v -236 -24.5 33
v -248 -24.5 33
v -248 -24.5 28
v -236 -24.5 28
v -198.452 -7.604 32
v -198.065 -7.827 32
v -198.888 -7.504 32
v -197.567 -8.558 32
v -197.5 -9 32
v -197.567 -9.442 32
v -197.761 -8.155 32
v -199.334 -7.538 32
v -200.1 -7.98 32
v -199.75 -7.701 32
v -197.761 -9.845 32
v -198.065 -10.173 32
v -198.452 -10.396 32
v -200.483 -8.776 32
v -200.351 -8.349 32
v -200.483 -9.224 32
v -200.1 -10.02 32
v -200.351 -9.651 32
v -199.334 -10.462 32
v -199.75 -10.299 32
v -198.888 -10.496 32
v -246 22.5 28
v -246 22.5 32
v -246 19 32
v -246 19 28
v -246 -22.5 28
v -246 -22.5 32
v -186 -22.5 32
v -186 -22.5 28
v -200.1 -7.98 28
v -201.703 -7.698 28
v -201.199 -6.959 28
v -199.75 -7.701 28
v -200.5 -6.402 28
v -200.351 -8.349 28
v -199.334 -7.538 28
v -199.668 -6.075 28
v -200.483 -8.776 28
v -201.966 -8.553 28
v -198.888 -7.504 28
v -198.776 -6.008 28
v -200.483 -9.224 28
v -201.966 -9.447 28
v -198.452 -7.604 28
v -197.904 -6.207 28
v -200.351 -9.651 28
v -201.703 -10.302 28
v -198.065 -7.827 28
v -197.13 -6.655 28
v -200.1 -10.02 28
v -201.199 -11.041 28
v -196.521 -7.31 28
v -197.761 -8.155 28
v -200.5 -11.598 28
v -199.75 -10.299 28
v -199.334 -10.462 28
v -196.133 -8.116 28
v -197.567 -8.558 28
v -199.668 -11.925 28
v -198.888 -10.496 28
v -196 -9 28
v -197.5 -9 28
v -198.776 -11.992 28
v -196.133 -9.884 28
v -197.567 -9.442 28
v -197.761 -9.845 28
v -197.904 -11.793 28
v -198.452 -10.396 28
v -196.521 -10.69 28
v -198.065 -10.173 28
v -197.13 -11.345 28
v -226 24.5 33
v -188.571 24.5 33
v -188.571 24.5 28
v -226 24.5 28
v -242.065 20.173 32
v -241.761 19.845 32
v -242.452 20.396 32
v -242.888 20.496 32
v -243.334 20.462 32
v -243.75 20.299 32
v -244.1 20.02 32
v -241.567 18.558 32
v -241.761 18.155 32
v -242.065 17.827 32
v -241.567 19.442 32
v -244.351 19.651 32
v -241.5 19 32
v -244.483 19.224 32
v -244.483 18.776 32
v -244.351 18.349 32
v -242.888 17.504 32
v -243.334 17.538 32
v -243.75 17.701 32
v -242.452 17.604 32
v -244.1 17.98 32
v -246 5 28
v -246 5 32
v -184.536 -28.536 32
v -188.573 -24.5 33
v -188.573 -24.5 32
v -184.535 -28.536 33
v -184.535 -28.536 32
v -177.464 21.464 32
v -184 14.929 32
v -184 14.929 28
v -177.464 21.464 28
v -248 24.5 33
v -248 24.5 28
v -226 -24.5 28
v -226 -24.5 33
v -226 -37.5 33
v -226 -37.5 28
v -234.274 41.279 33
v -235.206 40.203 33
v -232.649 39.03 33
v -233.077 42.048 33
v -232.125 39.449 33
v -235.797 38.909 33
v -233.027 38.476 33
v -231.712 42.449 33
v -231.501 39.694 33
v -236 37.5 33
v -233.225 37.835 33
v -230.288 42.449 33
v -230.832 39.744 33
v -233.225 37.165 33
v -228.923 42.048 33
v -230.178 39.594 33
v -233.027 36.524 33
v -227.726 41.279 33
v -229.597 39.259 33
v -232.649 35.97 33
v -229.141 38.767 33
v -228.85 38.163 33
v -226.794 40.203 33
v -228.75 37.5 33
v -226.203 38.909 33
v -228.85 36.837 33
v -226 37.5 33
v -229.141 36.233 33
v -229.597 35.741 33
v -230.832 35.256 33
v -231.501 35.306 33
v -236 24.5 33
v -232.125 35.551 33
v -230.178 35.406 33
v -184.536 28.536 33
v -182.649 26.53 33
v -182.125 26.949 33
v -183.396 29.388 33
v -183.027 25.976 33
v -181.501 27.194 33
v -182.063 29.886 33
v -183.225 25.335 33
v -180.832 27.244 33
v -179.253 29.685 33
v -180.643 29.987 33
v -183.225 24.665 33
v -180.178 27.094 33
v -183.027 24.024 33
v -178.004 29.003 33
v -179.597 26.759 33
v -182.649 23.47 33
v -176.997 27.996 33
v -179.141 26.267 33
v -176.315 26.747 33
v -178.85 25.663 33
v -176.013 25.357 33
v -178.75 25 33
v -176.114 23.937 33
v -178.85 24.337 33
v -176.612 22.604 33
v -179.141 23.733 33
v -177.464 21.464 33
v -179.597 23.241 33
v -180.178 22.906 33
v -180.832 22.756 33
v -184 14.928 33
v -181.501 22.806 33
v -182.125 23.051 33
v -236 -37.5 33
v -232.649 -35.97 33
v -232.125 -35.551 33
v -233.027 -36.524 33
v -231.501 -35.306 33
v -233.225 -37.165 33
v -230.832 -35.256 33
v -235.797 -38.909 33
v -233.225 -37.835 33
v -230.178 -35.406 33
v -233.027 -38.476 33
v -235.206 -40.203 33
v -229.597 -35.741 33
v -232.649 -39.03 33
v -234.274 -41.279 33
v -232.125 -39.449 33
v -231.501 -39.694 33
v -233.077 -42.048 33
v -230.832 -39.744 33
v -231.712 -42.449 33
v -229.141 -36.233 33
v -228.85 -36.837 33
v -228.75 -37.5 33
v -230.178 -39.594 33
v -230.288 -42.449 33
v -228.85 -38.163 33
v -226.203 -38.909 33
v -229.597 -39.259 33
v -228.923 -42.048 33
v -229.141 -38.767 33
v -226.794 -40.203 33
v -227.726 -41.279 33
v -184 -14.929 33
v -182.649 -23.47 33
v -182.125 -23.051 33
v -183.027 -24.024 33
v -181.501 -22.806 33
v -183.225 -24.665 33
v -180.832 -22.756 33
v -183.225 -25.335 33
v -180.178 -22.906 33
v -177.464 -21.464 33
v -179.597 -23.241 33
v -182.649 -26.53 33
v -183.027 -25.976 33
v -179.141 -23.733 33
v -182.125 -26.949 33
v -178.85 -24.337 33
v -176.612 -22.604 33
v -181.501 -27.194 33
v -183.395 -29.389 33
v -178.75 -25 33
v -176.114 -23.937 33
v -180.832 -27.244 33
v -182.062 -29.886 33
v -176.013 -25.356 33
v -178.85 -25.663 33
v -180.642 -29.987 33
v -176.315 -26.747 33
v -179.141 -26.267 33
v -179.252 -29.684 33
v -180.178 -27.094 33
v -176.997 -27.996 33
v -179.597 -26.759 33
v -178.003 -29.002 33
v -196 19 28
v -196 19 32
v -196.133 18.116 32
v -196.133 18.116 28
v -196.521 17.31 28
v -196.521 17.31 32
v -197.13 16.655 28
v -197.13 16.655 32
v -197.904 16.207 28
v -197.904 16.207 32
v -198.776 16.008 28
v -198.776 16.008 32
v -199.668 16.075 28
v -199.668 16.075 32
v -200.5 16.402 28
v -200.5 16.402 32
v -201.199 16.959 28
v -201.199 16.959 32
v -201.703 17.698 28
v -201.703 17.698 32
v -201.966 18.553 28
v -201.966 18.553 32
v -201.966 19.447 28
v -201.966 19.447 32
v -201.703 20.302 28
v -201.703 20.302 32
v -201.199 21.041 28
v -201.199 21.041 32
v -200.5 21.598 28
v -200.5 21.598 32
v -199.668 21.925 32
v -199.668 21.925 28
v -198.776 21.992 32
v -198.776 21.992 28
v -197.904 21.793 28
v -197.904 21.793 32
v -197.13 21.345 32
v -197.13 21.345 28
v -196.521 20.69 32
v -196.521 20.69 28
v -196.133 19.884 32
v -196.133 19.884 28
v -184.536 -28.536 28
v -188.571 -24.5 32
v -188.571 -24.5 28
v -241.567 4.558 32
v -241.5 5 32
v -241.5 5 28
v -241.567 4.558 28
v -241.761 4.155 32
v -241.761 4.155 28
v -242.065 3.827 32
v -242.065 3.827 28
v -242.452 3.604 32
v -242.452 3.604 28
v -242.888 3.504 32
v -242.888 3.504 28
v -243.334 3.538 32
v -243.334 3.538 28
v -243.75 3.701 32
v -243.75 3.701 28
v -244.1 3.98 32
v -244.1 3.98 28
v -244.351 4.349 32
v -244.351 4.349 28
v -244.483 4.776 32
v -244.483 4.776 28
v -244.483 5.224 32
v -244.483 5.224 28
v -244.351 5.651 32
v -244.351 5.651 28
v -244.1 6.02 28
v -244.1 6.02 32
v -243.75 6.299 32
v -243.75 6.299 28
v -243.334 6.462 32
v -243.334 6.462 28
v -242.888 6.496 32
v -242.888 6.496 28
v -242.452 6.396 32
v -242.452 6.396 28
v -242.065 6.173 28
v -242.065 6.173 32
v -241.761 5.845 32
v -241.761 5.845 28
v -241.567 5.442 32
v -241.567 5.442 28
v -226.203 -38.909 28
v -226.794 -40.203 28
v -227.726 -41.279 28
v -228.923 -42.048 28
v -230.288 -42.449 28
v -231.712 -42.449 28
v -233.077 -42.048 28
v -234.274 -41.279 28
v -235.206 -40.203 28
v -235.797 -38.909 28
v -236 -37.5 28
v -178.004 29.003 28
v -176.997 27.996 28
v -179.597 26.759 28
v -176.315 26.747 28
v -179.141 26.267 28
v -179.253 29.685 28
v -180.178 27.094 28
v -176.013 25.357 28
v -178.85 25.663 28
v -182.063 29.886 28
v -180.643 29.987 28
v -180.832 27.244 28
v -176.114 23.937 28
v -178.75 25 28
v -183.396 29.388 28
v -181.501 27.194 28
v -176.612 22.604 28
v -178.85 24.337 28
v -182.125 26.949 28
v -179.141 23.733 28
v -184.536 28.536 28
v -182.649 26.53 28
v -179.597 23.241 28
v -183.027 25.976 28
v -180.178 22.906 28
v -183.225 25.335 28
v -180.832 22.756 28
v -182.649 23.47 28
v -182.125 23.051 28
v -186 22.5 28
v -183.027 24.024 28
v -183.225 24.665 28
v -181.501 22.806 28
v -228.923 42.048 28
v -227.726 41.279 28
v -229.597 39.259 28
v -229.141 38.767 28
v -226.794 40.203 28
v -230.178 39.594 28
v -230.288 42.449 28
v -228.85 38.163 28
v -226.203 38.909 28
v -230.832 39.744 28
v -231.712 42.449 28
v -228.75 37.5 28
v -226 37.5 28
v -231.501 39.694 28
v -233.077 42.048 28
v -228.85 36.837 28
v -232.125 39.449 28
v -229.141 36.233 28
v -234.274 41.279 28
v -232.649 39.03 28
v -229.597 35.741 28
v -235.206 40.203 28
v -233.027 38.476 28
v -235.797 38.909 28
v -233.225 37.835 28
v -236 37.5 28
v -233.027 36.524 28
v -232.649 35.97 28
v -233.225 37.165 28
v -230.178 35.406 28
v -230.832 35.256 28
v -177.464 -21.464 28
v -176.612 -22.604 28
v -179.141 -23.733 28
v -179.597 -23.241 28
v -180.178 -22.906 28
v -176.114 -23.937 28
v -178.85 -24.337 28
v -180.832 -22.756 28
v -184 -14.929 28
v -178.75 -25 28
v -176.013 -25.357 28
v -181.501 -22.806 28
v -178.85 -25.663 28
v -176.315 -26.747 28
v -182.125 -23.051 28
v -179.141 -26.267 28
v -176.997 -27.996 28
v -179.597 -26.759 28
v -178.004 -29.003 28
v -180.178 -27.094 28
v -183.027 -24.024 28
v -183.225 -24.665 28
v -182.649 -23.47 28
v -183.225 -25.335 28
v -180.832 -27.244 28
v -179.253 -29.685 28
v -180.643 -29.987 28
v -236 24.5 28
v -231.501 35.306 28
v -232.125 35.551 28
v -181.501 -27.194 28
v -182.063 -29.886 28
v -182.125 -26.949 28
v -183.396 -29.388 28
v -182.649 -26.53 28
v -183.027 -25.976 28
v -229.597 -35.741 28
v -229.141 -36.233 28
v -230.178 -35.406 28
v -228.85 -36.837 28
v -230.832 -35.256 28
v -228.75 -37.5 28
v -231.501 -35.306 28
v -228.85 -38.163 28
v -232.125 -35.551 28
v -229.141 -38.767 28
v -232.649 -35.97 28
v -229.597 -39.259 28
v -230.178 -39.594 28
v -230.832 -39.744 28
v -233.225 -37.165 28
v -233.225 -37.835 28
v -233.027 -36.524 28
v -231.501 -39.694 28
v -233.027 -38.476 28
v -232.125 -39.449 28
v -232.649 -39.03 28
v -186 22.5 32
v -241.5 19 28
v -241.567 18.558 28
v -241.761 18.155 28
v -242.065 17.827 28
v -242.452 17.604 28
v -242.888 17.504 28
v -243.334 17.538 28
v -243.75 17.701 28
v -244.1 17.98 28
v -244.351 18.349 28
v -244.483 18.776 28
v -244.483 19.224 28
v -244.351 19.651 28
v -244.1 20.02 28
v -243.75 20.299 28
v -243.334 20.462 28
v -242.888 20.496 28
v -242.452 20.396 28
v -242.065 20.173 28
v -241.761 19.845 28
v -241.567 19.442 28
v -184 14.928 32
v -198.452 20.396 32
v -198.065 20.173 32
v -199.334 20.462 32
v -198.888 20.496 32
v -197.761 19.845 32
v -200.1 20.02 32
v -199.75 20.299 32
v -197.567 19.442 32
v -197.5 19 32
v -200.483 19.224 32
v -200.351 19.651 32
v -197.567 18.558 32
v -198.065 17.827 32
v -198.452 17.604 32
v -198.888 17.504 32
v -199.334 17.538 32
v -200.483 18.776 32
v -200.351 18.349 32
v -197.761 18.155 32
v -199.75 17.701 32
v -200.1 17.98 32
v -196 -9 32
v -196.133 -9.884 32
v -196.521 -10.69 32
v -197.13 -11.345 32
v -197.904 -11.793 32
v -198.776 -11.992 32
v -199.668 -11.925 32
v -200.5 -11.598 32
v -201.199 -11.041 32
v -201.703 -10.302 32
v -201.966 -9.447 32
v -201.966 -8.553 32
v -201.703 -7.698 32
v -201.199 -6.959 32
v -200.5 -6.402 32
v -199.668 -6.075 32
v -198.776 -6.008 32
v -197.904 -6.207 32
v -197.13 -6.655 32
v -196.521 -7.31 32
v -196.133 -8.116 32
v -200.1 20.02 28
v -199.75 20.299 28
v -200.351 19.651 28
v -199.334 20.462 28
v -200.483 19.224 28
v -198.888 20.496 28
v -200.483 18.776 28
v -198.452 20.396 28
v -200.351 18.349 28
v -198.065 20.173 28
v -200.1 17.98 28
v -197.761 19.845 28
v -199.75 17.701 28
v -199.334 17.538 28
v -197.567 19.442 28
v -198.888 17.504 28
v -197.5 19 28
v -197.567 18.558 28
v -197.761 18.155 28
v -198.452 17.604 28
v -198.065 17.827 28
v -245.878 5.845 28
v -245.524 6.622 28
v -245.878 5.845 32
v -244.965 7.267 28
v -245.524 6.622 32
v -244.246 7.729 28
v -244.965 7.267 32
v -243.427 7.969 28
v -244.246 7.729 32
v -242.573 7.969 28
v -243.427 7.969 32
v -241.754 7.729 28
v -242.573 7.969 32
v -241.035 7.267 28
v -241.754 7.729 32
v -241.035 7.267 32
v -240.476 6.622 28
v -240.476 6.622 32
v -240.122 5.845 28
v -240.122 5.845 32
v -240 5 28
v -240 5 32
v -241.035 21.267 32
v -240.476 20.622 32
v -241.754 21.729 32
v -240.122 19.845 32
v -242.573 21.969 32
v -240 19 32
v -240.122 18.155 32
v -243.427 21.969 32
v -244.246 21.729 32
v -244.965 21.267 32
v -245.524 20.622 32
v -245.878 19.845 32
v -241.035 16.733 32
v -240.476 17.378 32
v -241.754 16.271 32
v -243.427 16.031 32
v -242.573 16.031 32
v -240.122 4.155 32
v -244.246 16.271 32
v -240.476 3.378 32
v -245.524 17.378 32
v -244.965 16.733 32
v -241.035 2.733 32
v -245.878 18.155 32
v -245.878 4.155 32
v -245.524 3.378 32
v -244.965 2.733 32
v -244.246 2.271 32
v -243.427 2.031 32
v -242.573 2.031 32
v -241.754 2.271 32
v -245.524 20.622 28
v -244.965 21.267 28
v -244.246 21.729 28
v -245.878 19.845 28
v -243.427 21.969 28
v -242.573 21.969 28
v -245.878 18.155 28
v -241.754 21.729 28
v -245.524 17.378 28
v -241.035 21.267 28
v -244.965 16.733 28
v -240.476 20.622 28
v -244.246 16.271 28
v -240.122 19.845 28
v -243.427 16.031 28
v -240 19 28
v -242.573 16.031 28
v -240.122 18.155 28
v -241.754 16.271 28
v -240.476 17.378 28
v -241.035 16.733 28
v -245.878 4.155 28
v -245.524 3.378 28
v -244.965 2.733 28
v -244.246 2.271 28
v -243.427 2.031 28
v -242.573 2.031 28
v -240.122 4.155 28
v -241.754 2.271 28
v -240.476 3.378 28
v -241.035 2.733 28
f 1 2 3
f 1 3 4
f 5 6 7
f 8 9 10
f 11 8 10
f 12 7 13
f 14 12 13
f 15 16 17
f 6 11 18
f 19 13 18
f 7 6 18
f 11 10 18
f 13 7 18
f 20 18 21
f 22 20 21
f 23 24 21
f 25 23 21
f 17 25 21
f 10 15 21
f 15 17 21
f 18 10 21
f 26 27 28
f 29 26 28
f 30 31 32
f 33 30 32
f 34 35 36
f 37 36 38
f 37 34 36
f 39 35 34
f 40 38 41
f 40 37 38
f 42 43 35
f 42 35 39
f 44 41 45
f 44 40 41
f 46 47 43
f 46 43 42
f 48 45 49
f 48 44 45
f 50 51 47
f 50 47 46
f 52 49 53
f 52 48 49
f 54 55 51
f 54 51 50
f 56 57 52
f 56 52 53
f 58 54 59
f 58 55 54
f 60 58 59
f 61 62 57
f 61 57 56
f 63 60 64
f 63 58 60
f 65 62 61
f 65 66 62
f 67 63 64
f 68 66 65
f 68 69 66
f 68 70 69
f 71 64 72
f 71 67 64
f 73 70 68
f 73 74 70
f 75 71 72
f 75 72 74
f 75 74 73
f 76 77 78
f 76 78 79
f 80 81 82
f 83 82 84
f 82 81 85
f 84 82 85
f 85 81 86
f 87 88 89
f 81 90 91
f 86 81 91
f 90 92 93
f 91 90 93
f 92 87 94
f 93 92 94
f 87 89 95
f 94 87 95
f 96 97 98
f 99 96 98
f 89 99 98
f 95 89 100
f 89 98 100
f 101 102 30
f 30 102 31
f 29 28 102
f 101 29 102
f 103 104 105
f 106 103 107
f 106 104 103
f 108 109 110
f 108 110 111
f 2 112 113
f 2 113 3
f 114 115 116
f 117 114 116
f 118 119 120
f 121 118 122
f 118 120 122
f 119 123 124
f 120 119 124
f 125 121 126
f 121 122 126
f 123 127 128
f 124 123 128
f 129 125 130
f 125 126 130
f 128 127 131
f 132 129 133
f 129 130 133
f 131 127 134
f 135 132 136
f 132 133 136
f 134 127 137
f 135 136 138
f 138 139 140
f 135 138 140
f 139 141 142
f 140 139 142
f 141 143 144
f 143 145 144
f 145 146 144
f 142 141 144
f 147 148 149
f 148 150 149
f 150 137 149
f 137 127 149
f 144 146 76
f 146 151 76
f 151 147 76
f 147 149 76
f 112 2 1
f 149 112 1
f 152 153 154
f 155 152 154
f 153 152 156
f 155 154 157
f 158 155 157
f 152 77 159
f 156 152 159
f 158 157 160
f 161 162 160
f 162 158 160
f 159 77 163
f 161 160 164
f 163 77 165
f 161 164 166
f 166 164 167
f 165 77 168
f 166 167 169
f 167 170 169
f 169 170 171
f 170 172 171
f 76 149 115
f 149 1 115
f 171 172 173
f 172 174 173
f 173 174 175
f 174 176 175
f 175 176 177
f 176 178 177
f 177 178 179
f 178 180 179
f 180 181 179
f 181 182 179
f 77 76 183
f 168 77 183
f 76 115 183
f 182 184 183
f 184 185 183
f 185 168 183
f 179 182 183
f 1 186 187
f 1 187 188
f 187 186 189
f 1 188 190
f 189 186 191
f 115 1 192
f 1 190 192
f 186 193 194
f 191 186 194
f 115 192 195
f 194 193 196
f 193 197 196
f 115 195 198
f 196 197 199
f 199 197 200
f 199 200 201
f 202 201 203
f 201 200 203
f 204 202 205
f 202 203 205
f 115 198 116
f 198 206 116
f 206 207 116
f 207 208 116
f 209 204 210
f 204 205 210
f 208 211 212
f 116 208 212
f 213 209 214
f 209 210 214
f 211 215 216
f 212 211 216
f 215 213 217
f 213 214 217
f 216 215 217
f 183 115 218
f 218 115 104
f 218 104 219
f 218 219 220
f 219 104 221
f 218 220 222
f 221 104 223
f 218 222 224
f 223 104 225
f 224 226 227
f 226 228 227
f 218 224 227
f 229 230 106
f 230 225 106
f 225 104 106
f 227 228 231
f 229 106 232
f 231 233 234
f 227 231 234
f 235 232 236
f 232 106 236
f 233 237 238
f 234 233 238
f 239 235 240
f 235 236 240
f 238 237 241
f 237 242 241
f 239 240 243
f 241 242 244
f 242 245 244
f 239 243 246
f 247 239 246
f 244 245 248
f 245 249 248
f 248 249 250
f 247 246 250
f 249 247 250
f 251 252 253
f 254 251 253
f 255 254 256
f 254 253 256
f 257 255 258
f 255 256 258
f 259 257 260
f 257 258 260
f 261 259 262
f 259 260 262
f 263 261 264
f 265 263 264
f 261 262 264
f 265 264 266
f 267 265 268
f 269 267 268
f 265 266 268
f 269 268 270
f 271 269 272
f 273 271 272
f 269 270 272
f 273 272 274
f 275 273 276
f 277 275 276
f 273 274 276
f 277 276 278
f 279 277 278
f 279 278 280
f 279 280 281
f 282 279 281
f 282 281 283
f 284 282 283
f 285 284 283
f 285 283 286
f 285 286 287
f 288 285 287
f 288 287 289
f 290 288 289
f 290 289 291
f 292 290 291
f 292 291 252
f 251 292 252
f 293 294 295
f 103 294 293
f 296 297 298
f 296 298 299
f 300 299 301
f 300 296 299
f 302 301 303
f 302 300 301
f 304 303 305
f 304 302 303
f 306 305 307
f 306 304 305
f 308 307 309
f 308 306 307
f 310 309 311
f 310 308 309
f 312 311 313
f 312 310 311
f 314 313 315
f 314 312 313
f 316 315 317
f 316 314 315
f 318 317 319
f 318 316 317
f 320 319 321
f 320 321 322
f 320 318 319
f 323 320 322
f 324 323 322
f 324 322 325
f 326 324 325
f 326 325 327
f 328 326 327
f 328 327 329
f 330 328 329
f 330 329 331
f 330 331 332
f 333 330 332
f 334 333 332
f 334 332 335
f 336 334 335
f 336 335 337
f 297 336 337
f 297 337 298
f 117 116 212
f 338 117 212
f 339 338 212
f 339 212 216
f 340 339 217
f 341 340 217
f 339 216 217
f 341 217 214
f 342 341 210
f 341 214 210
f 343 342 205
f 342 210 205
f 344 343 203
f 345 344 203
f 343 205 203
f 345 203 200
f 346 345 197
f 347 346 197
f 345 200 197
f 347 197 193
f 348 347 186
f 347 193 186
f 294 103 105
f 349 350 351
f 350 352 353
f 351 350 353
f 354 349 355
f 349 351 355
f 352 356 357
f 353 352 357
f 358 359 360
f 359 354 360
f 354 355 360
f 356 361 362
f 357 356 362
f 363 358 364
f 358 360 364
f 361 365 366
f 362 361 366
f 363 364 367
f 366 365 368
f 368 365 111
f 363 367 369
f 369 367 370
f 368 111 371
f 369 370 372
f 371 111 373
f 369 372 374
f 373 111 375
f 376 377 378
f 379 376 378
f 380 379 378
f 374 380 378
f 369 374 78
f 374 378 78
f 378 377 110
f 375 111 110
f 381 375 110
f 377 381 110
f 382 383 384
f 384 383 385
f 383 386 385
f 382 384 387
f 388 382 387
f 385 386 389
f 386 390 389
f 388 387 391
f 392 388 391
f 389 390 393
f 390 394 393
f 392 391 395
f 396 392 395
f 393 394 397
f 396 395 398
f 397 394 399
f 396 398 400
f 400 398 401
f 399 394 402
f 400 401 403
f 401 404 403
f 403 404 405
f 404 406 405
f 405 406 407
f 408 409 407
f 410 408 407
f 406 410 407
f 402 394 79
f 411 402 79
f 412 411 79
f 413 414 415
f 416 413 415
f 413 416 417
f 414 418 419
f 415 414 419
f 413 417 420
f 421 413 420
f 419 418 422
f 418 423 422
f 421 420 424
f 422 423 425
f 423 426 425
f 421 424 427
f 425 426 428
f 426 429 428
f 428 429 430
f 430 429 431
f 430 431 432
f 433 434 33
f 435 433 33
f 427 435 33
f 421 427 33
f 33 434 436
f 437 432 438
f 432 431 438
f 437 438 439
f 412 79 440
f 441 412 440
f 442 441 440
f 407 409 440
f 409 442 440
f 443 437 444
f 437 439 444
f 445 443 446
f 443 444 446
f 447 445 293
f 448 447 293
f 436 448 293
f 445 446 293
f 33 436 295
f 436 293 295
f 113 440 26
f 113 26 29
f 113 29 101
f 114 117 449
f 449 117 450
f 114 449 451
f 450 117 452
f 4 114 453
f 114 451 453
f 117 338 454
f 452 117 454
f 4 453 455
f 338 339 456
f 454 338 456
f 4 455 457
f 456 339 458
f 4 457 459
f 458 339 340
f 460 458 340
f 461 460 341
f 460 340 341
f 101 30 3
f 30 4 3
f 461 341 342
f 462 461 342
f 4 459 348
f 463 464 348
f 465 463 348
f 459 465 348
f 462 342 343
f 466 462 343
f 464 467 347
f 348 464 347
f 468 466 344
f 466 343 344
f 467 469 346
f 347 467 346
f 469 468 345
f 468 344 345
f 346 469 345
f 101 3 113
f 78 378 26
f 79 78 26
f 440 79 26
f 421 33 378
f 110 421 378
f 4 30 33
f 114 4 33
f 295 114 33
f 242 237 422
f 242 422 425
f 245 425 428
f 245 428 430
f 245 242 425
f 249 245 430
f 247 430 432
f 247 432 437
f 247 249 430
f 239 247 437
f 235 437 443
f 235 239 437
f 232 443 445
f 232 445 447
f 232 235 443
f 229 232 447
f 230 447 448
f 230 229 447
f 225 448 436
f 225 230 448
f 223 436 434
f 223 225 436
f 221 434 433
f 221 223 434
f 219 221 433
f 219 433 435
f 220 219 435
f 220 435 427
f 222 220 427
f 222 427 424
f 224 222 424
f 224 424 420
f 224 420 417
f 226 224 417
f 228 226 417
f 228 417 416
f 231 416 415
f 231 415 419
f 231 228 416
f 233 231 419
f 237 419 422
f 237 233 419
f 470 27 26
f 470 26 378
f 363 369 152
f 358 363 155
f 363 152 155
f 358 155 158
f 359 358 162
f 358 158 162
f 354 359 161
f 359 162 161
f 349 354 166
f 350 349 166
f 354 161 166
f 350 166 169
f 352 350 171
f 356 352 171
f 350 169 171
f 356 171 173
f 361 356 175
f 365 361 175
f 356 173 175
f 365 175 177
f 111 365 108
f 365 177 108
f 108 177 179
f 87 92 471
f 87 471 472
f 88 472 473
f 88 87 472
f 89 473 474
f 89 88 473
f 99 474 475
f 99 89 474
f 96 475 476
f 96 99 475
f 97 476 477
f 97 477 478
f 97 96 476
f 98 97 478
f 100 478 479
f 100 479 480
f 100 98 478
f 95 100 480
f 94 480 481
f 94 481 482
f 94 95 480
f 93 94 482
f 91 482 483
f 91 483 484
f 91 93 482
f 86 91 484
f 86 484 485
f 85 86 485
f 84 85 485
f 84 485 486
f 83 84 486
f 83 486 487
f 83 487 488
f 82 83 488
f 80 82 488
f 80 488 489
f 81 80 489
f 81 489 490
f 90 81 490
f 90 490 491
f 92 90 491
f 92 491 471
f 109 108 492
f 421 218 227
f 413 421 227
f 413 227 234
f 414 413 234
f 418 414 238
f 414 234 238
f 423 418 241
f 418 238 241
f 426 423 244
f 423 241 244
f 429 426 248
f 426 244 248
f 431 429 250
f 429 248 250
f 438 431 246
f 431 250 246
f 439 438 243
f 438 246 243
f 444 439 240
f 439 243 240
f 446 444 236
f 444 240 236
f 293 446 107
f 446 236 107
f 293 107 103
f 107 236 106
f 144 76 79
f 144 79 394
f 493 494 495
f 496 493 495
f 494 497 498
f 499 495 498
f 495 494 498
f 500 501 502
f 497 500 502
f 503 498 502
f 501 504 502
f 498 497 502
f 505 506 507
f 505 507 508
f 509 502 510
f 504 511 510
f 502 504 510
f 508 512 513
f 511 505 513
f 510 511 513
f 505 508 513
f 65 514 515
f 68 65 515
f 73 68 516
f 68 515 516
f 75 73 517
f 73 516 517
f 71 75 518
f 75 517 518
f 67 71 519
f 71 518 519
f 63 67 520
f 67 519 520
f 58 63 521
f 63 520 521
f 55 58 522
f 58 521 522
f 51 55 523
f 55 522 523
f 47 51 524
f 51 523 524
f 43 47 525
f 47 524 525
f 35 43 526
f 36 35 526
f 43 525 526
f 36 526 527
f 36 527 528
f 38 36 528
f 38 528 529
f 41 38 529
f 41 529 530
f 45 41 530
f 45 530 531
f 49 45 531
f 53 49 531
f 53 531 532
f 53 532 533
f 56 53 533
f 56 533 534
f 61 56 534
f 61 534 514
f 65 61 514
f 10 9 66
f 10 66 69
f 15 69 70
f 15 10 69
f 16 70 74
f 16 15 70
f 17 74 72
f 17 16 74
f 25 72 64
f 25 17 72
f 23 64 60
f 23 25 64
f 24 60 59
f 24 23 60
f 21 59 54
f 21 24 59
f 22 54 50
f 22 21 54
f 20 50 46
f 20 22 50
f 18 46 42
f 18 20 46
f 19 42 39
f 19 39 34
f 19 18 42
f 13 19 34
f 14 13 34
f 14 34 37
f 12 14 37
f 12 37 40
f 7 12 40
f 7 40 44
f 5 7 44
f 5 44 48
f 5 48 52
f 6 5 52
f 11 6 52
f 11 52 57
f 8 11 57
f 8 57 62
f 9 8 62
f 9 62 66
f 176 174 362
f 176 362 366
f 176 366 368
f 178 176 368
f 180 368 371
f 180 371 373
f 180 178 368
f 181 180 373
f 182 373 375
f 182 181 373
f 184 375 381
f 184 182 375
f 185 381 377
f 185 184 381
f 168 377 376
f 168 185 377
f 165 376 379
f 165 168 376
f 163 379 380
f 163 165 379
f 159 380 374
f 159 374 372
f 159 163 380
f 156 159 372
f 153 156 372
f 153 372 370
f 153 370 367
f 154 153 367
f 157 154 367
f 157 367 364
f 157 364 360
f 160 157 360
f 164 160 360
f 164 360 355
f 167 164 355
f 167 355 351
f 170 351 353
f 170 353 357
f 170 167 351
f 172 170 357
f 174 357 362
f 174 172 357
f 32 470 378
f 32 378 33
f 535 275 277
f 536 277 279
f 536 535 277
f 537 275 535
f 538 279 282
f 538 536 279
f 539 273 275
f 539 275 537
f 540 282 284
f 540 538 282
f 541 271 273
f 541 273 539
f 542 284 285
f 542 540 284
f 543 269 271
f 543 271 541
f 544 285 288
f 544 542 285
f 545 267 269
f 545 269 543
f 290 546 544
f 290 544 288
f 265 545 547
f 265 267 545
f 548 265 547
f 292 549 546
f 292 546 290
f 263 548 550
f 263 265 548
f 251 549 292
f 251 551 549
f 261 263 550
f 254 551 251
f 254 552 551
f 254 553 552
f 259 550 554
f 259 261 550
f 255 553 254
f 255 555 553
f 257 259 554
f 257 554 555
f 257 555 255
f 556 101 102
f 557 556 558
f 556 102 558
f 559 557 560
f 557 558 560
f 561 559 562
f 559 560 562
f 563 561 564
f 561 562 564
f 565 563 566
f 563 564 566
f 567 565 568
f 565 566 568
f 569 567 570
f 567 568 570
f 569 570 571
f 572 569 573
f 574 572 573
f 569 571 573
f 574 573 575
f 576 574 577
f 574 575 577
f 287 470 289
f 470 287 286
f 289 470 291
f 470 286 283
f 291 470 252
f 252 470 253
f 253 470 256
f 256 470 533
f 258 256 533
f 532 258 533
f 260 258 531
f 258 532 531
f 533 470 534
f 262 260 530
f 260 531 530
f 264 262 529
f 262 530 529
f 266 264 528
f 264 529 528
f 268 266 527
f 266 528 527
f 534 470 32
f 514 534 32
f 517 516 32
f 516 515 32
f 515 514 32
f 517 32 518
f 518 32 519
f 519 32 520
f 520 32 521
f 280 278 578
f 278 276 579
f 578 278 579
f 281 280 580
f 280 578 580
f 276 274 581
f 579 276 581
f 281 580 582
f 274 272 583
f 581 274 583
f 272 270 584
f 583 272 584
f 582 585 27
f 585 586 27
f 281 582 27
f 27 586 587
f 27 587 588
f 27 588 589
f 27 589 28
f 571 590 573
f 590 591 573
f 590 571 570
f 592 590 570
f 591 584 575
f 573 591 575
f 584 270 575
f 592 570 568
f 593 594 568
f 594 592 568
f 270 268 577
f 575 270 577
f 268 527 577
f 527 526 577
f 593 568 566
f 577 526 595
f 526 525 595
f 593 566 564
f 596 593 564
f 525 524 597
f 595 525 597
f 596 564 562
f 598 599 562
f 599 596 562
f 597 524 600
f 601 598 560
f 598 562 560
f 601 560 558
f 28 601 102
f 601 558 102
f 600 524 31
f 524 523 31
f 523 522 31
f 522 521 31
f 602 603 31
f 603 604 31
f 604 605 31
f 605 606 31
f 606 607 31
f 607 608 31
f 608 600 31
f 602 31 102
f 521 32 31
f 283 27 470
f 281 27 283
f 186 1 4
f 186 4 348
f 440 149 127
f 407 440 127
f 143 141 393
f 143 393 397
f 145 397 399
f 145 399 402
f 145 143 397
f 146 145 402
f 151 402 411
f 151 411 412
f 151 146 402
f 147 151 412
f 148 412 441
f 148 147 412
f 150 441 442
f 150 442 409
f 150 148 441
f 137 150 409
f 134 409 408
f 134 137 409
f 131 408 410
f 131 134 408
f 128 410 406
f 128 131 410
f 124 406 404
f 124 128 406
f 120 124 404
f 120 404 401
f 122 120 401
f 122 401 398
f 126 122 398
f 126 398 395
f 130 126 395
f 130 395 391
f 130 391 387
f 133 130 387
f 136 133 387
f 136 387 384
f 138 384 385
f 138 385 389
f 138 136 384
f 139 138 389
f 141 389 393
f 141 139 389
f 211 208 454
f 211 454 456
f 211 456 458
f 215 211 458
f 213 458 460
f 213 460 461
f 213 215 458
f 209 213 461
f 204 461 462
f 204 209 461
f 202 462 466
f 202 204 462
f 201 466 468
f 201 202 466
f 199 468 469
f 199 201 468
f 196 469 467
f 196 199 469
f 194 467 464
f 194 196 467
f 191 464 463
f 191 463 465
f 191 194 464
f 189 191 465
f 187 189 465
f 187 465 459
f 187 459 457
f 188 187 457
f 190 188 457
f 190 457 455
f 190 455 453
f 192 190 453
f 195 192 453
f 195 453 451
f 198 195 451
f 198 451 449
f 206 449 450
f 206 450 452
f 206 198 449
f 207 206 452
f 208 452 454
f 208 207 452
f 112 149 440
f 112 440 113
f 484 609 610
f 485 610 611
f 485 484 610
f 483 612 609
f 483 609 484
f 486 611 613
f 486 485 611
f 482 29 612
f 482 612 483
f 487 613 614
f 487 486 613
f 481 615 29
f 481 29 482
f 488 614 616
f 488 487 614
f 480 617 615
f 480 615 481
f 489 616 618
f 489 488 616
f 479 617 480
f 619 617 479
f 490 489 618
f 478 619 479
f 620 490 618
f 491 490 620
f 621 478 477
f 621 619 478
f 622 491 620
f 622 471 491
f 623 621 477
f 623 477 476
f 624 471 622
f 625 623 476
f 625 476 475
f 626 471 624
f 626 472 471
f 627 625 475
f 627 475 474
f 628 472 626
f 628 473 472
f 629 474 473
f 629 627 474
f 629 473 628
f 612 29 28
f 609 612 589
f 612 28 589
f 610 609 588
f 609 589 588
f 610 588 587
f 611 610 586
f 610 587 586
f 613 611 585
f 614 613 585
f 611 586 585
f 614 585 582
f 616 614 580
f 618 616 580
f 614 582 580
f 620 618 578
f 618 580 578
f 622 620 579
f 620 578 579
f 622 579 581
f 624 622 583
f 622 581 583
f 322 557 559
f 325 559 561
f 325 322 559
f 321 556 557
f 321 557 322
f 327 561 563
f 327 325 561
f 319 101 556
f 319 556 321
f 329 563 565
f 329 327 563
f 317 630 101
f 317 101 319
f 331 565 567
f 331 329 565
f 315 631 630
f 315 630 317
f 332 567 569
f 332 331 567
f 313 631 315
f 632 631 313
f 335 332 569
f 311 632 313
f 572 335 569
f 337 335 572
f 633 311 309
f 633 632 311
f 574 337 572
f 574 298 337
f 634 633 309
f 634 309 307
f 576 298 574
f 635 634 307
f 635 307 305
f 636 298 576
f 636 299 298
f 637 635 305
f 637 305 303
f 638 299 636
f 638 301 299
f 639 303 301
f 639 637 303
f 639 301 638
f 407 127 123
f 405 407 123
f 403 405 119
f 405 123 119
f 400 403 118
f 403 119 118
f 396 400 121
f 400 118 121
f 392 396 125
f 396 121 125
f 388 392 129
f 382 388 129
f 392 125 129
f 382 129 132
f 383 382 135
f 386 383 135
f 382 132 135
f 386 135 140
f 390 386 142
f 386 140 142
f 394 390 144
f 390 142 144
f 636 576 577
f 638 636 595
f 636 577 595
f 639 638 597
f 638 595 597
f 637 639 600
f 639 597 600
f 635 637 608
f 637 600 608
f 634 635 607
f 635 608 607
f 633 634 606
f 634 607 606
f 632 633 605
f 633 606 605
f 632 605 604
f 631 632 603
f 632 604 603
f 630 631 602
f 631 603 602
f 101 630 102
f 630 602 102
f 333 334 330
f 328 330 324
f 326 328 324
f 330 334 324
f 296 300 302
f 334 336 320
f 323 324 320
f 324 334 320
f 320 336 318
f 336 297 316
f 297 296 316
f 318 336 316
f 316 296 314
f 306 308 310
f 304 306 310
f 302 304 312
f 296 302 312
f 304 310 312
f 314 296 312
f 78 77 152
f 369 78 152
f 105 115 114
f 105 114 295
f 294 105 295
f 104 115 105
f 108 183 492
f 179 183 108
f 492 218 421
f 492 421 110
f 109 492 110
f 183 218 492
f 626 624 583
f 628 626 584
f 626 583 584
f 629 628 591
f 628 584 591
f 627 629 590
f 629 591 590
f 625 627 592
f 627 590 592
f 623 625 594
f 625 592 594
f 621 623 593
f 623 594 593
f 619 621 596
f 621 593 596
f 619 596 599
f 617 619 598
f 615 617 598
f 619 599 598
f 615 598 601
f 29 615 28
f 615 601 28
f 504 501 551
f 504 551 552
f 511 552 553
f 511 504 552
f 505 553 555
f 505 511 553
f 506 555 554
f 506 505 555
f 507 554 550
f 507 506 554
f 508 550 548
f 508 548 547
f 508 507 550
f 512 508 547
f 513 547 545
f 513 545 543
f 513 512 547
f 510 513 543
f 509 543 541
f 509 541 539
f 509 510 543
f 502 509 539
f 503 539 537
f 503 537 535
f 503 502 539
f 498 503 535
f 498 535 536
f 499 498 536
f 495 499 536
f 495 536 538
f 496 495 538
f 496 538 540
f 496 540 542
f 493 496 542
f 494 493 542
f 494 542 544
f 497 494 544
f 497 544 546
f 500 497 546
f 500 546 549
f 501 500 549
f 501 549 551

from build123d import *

# Parameters (mm, degrees)
SKETCH123_W             = 60
SKETCH123_H             = 45
PAD050_DEPTH            = 5
PAD099_DEPTH            = 1
SKETCH128_R             = 3
SKETCH128_R_2           = 1.5
PAD100_DEPTH            = 5
SKETCH223_R             = 2.25
POCKET090_DEPTH         = 5
BODY015_PLACEMENT_ANGLE = 180


with BuildPart() as part:
    # Sketch123 → Pad050 (new body)
    with BuildSketch(Plane.XY):
        with BuildLine():
            Line((-32, 24.5), (-20, 24.5))
            Line((-20, 24.5), (-20, 37.5))
            ThreePointArc((-10, 37.5), (-15, 42.5), (-20, 37.5))
            Line((-10, 24.5), (-10, 37.5))
            Line((-10, 24.5), (27.428932, 24.5))
            Line((27.428932, 24.5), (31.464466, 28.535534))
            ThreePointArc((38.535534, 21.464466), (38.535534, 28.535534), (31.464466, 28.535534))
            Line((32, 14.928932), (38.535534, 21.464466))
            Line((32, 14.928932), (32, -14.928932))
            Line((32, -14.928932), (38.535534, -21.464466))
            ThreePointArc((31.464466, -28.535534), (38.535534, -28.535534), (38.535534, -21.464466))
            Line((27.428932, -24.5), (31.464466, -28.535534))
            Line((27.428932, -24.5), (-10, -24.5))
            Line((-10, -24.5), (-10, -37.5))
            ThreePointArc((-20, -37.5), (-15, -42.5), (-10, -37.5))
            Line((-20, -24.5), (-20, -37.5))
            Line((-20, -24.5), (-32, -24.5))
            Line((-32, -24.5), (-32, 24.5))
        make_face()
        Rectangle(SKETCH123_W, SKETCH123_H, mode=Mode.SUBTRACT)
    extrude(amount=PAD050_DEPTH)

    # Sketch222 → Pad099 (join)
    with BuildSketch(Plane.XY):
        with BuildLine():
            Line((-31, 23.5), (-20, 23.5))
            Line((-20, 23.5), (-20, 37.5))
            ThreePointArc((-10, 37.5), (-15, 42.5), (-20, 37.5))
            Line((-10, 23.5), (-10, 37.5))
            Line((-10, 23.5), (26.426435, 23.5))
            Line((26.426435, 23.5), (31.465342, 28.53641))
            ThreePointArc((38.534658, 21.46359), (38.53641, 28.534658), (31.465342, 28.53641))
            Line((31, 13.932666), (38.534658, 21.46359))
            Line((31, 13.932666), (31, -13.927334))
            Line((31, -13.927334), (38.535909, -21.464841))
            ThreePointArc((31.464091, -28.535159), (38.535159, -28.535909), (38.535909, -21.464841))
            Line((26.43, -23.5), (31.464091, -28.535159))
            Line((26.43, -23.5), (-10, -23.5))
            Line((-10, -23.5), (-10, -37.5))
            ThreePointArc((-20, -37.5), (-15, -42.5), (-10, -37.5))
            Line((-20, -23.5), (-20, -37.5))
            Line((-20, -23.5), (-31, -23.5))
            Line((-31, -23.5), (-31, 23.5))
        make_face()
    extrude(amount=PAD099_DEPTH)

    # Sketch128 → Pad100 (join)
    with BuildSketch(Plane.XY):
        with Locations((-27, -5)):
            Circle(SKETCH128_R)
        with Locations((-27, -5)):
            Circle(SKETCH128_R_2, mode=Mode.SUBTRACT)
        with Locations((-27, -19)):
            Circle(SKETCH128_R)
        with Locations((-27, -19)):
            Circle(SKETCH128_R_2, mode=Mode.SUBTRACT)
        with Locations((17, 9)):
            Circle(SKETCH128_R)
        with Locations((17, 9)):
            Circle(SKETCH128_R_2, mode=Mode.SUBTRACT)
        with Locations((17, -19)):
            Circle(SKETCH128_R)
        with Locations((17, -19)):
            Circle(SKETCH128_R_2, mode=Mode.SUBTRACT)
    extrude(amount=PAD100_DEPTH)

    # Sketch223 → Pocket090 (cut)
    with BuildSketch(Plane.XY):
        with Locations((35, -25)):
            Circle(SKETCH223_R)
        with Locations((35, 25)):
            Circle(SKETCH223_R)
        with Locations((-15, 37.5)):
            Circle(SKETCH223_R)
        with Locations((-15, -37.5)):
            Circle(SKETCH223_R)
    extrude(amount=POCKET090_DEPTH, mode=Mode.SUBTRACT)


with BuildPart() as part_1:
    # Body015 placement: moved
    add(part.part.moved(Location((-216, 0, 33))).rotate(Axis((-216, 0, 33), (1, 0, 0)), BODY015_PLACEMENT_ANGLE))


solid = part_1.part
